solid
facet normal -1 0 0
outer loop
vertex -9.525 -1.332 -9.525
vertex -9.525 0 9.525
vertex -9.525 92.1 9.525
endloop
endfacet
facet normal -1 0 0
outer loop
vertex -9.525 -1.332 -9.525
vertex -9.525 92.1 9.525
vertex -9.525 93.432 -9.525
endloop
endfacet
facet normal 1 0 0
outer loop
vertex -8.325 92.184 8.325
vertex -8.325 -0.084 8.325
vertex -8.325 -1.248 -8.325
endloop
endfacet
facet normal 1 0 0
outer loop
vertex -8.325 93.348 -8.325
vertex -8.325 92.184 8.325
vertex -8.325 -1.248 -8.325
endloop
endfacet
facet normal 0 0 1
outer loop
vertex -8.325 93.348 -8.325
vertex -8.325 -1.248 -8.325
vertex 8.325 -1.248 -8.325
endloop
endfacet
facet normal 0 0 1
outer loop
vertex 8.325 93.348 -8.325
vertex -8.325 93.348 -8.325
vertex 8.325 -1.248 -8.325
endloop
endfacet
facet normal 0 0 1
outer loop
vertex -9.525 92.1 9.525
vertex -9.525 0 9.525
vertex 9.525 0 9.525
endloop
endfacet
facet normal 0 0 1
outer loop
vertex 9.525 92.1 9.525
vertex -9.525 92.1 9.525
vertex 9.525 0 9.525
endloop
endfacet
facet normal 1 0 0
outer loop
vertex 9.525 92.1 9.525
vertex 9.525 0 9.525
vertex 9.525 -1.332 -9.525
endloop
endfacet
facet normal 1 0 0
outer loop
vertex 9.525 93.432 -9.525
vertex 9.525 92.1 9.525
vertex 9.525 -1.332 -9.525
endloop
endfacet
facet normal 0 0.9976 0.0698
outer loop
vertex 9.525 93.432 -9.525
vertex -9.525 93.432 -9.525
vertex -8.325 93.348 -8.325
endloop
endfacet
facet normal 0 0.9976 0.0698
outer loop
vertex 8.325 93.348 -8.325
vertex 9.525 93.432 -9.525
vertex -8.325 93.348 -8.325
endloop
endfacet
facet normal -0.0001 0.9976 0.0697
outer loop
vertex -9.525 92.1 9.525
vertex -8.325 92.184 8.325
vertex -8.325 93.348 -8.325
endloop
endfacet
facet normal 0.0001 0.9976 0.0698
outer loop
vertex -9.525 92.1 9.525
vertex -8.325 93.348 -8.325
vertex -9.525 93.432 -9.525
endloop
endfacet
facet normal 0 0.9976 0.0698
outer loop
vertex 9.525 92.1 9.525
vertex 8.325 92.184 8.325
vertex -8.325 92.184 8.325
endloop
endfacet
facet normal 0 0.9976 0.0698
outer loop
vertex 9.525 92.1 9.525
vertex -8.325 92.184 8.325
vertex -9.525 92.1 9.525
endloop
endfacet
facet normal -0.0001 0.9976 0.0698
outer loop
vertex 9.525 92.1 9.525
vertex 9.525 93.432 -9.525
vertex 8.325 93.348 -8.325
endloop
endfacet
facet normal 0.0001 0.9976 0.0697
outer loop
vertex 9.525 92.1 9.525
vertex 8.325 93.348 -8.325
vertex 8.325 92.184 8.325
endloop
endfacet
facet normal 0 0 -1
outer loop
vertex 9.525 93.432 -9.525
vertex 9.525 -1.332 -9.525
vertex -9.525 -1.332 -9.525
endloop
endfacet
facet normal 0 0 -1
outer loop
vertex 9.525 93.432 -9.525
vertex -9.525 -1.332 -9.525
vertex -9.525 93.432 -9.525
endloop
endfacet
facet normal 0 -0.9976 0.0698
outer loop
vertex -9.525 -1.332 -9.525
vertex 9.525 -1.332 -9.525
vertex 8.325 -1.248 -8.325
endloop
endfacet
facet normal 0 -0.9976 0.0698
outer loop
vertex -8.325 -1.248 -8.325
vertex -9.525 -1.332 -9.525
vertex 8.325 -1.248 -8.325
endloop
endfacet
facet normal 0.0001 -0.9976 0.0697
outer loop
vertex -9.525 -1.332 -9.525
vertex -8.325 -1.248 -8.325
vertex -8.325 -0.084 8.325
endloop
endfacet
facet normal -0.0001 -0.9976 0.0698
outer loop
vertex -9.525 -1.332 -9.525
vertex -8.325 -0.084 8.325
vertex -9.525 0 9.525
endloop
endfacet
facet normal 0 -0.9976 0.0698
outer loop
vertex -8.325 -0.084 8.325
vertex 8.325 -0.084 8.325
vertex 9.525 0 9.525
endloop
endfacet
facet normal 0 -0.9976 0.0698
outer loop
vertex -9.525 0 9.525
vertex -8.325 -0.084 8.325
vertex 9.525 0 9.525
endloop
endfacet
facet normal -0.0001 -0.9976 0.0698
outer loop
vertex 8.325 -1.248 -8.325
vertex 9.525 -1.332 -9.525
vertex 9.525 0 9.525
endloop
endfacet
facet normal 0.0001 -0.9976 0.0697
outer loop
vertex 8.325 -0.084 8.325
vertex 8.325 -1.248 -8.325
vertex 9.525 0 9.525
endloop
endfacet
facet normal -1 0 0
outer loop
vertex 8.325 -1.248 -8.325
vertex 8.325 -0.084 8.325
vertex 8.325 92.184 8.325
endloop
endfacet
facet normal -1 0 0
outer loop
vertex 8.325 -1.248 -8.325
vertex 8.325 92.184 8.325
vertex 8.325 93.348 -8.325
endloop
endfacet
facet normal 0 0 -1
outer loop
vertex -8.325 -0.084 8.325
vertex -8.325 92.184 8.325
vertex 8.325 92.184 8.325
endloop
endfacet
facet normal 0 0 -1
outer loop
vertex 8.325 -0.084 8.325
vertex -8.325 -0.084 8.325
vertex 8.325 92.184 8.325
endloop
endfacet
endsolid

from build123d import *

# Parameters (mm, degrees)
SKETCH1_W               = 19.05
SKETCH1_H               = 19.05
BOSS_EXTRUDE1_DEPTH     = 92.1
BOSS_EXTRUDE2_DEPTH     = 19.05
CUT_EXTRUDE1_DEPTH      = 95.398144252
CUT_EXTRUDE1_DEPTH_BACK = 95.398144252
SKETCH4_W               = 16.65
SKETCH4_H               = 16.65


with BuildPart() as part:
    # Sketch1 → Boss-Extrude1 (new body)
    with BuildSketch(Plane(origin=(0, 0, 0), x_dir=(1, 0, 0), z_dir=(0, 1, 0))):
        Rectangle(SKETCH1_W, SKETCH1_H)
    extrude(amount=BOSS_EXTRUDE1_DEPTH)

    # Sketch2 → Boss-Extrude2 (add)
    with BuildSketch(Plane(origin=(9.525, 0, 0), x_dir=(0, 0, -1), z_dir=(1, 0, 0))):
        Polygon((-9.525, 92.1), (9.525, 92.1), (9.525, 93.432105768), align=None)
        Polygon((9.525, -1.332105768), (-9.525, 0), (9.525, 0), align=None)
    extrude(amount=-BOSS_EXTRUDE2_DEPTH)

    # Sketch4 → Cut-Extrude1 (cut, two sides: drawn at the far end of the back side and taken through both)
    with BuildSketch(Plane(origin=(0, 0, 0), x_dir=(1, 0, 0), z_dir=(0, 1, 0)).offset(-CUT_EXTRUDE1_DEPTH_BACK)):
        Rectangle(SKETCH4_W, SKETCH4_H)
    extrude(amount=CUT_EXTRUDE1_DEPTH + CUT_EXTRUDE1_DEPTH_BACK, mode=Mode.SUBTRACT)


solid = part.part
